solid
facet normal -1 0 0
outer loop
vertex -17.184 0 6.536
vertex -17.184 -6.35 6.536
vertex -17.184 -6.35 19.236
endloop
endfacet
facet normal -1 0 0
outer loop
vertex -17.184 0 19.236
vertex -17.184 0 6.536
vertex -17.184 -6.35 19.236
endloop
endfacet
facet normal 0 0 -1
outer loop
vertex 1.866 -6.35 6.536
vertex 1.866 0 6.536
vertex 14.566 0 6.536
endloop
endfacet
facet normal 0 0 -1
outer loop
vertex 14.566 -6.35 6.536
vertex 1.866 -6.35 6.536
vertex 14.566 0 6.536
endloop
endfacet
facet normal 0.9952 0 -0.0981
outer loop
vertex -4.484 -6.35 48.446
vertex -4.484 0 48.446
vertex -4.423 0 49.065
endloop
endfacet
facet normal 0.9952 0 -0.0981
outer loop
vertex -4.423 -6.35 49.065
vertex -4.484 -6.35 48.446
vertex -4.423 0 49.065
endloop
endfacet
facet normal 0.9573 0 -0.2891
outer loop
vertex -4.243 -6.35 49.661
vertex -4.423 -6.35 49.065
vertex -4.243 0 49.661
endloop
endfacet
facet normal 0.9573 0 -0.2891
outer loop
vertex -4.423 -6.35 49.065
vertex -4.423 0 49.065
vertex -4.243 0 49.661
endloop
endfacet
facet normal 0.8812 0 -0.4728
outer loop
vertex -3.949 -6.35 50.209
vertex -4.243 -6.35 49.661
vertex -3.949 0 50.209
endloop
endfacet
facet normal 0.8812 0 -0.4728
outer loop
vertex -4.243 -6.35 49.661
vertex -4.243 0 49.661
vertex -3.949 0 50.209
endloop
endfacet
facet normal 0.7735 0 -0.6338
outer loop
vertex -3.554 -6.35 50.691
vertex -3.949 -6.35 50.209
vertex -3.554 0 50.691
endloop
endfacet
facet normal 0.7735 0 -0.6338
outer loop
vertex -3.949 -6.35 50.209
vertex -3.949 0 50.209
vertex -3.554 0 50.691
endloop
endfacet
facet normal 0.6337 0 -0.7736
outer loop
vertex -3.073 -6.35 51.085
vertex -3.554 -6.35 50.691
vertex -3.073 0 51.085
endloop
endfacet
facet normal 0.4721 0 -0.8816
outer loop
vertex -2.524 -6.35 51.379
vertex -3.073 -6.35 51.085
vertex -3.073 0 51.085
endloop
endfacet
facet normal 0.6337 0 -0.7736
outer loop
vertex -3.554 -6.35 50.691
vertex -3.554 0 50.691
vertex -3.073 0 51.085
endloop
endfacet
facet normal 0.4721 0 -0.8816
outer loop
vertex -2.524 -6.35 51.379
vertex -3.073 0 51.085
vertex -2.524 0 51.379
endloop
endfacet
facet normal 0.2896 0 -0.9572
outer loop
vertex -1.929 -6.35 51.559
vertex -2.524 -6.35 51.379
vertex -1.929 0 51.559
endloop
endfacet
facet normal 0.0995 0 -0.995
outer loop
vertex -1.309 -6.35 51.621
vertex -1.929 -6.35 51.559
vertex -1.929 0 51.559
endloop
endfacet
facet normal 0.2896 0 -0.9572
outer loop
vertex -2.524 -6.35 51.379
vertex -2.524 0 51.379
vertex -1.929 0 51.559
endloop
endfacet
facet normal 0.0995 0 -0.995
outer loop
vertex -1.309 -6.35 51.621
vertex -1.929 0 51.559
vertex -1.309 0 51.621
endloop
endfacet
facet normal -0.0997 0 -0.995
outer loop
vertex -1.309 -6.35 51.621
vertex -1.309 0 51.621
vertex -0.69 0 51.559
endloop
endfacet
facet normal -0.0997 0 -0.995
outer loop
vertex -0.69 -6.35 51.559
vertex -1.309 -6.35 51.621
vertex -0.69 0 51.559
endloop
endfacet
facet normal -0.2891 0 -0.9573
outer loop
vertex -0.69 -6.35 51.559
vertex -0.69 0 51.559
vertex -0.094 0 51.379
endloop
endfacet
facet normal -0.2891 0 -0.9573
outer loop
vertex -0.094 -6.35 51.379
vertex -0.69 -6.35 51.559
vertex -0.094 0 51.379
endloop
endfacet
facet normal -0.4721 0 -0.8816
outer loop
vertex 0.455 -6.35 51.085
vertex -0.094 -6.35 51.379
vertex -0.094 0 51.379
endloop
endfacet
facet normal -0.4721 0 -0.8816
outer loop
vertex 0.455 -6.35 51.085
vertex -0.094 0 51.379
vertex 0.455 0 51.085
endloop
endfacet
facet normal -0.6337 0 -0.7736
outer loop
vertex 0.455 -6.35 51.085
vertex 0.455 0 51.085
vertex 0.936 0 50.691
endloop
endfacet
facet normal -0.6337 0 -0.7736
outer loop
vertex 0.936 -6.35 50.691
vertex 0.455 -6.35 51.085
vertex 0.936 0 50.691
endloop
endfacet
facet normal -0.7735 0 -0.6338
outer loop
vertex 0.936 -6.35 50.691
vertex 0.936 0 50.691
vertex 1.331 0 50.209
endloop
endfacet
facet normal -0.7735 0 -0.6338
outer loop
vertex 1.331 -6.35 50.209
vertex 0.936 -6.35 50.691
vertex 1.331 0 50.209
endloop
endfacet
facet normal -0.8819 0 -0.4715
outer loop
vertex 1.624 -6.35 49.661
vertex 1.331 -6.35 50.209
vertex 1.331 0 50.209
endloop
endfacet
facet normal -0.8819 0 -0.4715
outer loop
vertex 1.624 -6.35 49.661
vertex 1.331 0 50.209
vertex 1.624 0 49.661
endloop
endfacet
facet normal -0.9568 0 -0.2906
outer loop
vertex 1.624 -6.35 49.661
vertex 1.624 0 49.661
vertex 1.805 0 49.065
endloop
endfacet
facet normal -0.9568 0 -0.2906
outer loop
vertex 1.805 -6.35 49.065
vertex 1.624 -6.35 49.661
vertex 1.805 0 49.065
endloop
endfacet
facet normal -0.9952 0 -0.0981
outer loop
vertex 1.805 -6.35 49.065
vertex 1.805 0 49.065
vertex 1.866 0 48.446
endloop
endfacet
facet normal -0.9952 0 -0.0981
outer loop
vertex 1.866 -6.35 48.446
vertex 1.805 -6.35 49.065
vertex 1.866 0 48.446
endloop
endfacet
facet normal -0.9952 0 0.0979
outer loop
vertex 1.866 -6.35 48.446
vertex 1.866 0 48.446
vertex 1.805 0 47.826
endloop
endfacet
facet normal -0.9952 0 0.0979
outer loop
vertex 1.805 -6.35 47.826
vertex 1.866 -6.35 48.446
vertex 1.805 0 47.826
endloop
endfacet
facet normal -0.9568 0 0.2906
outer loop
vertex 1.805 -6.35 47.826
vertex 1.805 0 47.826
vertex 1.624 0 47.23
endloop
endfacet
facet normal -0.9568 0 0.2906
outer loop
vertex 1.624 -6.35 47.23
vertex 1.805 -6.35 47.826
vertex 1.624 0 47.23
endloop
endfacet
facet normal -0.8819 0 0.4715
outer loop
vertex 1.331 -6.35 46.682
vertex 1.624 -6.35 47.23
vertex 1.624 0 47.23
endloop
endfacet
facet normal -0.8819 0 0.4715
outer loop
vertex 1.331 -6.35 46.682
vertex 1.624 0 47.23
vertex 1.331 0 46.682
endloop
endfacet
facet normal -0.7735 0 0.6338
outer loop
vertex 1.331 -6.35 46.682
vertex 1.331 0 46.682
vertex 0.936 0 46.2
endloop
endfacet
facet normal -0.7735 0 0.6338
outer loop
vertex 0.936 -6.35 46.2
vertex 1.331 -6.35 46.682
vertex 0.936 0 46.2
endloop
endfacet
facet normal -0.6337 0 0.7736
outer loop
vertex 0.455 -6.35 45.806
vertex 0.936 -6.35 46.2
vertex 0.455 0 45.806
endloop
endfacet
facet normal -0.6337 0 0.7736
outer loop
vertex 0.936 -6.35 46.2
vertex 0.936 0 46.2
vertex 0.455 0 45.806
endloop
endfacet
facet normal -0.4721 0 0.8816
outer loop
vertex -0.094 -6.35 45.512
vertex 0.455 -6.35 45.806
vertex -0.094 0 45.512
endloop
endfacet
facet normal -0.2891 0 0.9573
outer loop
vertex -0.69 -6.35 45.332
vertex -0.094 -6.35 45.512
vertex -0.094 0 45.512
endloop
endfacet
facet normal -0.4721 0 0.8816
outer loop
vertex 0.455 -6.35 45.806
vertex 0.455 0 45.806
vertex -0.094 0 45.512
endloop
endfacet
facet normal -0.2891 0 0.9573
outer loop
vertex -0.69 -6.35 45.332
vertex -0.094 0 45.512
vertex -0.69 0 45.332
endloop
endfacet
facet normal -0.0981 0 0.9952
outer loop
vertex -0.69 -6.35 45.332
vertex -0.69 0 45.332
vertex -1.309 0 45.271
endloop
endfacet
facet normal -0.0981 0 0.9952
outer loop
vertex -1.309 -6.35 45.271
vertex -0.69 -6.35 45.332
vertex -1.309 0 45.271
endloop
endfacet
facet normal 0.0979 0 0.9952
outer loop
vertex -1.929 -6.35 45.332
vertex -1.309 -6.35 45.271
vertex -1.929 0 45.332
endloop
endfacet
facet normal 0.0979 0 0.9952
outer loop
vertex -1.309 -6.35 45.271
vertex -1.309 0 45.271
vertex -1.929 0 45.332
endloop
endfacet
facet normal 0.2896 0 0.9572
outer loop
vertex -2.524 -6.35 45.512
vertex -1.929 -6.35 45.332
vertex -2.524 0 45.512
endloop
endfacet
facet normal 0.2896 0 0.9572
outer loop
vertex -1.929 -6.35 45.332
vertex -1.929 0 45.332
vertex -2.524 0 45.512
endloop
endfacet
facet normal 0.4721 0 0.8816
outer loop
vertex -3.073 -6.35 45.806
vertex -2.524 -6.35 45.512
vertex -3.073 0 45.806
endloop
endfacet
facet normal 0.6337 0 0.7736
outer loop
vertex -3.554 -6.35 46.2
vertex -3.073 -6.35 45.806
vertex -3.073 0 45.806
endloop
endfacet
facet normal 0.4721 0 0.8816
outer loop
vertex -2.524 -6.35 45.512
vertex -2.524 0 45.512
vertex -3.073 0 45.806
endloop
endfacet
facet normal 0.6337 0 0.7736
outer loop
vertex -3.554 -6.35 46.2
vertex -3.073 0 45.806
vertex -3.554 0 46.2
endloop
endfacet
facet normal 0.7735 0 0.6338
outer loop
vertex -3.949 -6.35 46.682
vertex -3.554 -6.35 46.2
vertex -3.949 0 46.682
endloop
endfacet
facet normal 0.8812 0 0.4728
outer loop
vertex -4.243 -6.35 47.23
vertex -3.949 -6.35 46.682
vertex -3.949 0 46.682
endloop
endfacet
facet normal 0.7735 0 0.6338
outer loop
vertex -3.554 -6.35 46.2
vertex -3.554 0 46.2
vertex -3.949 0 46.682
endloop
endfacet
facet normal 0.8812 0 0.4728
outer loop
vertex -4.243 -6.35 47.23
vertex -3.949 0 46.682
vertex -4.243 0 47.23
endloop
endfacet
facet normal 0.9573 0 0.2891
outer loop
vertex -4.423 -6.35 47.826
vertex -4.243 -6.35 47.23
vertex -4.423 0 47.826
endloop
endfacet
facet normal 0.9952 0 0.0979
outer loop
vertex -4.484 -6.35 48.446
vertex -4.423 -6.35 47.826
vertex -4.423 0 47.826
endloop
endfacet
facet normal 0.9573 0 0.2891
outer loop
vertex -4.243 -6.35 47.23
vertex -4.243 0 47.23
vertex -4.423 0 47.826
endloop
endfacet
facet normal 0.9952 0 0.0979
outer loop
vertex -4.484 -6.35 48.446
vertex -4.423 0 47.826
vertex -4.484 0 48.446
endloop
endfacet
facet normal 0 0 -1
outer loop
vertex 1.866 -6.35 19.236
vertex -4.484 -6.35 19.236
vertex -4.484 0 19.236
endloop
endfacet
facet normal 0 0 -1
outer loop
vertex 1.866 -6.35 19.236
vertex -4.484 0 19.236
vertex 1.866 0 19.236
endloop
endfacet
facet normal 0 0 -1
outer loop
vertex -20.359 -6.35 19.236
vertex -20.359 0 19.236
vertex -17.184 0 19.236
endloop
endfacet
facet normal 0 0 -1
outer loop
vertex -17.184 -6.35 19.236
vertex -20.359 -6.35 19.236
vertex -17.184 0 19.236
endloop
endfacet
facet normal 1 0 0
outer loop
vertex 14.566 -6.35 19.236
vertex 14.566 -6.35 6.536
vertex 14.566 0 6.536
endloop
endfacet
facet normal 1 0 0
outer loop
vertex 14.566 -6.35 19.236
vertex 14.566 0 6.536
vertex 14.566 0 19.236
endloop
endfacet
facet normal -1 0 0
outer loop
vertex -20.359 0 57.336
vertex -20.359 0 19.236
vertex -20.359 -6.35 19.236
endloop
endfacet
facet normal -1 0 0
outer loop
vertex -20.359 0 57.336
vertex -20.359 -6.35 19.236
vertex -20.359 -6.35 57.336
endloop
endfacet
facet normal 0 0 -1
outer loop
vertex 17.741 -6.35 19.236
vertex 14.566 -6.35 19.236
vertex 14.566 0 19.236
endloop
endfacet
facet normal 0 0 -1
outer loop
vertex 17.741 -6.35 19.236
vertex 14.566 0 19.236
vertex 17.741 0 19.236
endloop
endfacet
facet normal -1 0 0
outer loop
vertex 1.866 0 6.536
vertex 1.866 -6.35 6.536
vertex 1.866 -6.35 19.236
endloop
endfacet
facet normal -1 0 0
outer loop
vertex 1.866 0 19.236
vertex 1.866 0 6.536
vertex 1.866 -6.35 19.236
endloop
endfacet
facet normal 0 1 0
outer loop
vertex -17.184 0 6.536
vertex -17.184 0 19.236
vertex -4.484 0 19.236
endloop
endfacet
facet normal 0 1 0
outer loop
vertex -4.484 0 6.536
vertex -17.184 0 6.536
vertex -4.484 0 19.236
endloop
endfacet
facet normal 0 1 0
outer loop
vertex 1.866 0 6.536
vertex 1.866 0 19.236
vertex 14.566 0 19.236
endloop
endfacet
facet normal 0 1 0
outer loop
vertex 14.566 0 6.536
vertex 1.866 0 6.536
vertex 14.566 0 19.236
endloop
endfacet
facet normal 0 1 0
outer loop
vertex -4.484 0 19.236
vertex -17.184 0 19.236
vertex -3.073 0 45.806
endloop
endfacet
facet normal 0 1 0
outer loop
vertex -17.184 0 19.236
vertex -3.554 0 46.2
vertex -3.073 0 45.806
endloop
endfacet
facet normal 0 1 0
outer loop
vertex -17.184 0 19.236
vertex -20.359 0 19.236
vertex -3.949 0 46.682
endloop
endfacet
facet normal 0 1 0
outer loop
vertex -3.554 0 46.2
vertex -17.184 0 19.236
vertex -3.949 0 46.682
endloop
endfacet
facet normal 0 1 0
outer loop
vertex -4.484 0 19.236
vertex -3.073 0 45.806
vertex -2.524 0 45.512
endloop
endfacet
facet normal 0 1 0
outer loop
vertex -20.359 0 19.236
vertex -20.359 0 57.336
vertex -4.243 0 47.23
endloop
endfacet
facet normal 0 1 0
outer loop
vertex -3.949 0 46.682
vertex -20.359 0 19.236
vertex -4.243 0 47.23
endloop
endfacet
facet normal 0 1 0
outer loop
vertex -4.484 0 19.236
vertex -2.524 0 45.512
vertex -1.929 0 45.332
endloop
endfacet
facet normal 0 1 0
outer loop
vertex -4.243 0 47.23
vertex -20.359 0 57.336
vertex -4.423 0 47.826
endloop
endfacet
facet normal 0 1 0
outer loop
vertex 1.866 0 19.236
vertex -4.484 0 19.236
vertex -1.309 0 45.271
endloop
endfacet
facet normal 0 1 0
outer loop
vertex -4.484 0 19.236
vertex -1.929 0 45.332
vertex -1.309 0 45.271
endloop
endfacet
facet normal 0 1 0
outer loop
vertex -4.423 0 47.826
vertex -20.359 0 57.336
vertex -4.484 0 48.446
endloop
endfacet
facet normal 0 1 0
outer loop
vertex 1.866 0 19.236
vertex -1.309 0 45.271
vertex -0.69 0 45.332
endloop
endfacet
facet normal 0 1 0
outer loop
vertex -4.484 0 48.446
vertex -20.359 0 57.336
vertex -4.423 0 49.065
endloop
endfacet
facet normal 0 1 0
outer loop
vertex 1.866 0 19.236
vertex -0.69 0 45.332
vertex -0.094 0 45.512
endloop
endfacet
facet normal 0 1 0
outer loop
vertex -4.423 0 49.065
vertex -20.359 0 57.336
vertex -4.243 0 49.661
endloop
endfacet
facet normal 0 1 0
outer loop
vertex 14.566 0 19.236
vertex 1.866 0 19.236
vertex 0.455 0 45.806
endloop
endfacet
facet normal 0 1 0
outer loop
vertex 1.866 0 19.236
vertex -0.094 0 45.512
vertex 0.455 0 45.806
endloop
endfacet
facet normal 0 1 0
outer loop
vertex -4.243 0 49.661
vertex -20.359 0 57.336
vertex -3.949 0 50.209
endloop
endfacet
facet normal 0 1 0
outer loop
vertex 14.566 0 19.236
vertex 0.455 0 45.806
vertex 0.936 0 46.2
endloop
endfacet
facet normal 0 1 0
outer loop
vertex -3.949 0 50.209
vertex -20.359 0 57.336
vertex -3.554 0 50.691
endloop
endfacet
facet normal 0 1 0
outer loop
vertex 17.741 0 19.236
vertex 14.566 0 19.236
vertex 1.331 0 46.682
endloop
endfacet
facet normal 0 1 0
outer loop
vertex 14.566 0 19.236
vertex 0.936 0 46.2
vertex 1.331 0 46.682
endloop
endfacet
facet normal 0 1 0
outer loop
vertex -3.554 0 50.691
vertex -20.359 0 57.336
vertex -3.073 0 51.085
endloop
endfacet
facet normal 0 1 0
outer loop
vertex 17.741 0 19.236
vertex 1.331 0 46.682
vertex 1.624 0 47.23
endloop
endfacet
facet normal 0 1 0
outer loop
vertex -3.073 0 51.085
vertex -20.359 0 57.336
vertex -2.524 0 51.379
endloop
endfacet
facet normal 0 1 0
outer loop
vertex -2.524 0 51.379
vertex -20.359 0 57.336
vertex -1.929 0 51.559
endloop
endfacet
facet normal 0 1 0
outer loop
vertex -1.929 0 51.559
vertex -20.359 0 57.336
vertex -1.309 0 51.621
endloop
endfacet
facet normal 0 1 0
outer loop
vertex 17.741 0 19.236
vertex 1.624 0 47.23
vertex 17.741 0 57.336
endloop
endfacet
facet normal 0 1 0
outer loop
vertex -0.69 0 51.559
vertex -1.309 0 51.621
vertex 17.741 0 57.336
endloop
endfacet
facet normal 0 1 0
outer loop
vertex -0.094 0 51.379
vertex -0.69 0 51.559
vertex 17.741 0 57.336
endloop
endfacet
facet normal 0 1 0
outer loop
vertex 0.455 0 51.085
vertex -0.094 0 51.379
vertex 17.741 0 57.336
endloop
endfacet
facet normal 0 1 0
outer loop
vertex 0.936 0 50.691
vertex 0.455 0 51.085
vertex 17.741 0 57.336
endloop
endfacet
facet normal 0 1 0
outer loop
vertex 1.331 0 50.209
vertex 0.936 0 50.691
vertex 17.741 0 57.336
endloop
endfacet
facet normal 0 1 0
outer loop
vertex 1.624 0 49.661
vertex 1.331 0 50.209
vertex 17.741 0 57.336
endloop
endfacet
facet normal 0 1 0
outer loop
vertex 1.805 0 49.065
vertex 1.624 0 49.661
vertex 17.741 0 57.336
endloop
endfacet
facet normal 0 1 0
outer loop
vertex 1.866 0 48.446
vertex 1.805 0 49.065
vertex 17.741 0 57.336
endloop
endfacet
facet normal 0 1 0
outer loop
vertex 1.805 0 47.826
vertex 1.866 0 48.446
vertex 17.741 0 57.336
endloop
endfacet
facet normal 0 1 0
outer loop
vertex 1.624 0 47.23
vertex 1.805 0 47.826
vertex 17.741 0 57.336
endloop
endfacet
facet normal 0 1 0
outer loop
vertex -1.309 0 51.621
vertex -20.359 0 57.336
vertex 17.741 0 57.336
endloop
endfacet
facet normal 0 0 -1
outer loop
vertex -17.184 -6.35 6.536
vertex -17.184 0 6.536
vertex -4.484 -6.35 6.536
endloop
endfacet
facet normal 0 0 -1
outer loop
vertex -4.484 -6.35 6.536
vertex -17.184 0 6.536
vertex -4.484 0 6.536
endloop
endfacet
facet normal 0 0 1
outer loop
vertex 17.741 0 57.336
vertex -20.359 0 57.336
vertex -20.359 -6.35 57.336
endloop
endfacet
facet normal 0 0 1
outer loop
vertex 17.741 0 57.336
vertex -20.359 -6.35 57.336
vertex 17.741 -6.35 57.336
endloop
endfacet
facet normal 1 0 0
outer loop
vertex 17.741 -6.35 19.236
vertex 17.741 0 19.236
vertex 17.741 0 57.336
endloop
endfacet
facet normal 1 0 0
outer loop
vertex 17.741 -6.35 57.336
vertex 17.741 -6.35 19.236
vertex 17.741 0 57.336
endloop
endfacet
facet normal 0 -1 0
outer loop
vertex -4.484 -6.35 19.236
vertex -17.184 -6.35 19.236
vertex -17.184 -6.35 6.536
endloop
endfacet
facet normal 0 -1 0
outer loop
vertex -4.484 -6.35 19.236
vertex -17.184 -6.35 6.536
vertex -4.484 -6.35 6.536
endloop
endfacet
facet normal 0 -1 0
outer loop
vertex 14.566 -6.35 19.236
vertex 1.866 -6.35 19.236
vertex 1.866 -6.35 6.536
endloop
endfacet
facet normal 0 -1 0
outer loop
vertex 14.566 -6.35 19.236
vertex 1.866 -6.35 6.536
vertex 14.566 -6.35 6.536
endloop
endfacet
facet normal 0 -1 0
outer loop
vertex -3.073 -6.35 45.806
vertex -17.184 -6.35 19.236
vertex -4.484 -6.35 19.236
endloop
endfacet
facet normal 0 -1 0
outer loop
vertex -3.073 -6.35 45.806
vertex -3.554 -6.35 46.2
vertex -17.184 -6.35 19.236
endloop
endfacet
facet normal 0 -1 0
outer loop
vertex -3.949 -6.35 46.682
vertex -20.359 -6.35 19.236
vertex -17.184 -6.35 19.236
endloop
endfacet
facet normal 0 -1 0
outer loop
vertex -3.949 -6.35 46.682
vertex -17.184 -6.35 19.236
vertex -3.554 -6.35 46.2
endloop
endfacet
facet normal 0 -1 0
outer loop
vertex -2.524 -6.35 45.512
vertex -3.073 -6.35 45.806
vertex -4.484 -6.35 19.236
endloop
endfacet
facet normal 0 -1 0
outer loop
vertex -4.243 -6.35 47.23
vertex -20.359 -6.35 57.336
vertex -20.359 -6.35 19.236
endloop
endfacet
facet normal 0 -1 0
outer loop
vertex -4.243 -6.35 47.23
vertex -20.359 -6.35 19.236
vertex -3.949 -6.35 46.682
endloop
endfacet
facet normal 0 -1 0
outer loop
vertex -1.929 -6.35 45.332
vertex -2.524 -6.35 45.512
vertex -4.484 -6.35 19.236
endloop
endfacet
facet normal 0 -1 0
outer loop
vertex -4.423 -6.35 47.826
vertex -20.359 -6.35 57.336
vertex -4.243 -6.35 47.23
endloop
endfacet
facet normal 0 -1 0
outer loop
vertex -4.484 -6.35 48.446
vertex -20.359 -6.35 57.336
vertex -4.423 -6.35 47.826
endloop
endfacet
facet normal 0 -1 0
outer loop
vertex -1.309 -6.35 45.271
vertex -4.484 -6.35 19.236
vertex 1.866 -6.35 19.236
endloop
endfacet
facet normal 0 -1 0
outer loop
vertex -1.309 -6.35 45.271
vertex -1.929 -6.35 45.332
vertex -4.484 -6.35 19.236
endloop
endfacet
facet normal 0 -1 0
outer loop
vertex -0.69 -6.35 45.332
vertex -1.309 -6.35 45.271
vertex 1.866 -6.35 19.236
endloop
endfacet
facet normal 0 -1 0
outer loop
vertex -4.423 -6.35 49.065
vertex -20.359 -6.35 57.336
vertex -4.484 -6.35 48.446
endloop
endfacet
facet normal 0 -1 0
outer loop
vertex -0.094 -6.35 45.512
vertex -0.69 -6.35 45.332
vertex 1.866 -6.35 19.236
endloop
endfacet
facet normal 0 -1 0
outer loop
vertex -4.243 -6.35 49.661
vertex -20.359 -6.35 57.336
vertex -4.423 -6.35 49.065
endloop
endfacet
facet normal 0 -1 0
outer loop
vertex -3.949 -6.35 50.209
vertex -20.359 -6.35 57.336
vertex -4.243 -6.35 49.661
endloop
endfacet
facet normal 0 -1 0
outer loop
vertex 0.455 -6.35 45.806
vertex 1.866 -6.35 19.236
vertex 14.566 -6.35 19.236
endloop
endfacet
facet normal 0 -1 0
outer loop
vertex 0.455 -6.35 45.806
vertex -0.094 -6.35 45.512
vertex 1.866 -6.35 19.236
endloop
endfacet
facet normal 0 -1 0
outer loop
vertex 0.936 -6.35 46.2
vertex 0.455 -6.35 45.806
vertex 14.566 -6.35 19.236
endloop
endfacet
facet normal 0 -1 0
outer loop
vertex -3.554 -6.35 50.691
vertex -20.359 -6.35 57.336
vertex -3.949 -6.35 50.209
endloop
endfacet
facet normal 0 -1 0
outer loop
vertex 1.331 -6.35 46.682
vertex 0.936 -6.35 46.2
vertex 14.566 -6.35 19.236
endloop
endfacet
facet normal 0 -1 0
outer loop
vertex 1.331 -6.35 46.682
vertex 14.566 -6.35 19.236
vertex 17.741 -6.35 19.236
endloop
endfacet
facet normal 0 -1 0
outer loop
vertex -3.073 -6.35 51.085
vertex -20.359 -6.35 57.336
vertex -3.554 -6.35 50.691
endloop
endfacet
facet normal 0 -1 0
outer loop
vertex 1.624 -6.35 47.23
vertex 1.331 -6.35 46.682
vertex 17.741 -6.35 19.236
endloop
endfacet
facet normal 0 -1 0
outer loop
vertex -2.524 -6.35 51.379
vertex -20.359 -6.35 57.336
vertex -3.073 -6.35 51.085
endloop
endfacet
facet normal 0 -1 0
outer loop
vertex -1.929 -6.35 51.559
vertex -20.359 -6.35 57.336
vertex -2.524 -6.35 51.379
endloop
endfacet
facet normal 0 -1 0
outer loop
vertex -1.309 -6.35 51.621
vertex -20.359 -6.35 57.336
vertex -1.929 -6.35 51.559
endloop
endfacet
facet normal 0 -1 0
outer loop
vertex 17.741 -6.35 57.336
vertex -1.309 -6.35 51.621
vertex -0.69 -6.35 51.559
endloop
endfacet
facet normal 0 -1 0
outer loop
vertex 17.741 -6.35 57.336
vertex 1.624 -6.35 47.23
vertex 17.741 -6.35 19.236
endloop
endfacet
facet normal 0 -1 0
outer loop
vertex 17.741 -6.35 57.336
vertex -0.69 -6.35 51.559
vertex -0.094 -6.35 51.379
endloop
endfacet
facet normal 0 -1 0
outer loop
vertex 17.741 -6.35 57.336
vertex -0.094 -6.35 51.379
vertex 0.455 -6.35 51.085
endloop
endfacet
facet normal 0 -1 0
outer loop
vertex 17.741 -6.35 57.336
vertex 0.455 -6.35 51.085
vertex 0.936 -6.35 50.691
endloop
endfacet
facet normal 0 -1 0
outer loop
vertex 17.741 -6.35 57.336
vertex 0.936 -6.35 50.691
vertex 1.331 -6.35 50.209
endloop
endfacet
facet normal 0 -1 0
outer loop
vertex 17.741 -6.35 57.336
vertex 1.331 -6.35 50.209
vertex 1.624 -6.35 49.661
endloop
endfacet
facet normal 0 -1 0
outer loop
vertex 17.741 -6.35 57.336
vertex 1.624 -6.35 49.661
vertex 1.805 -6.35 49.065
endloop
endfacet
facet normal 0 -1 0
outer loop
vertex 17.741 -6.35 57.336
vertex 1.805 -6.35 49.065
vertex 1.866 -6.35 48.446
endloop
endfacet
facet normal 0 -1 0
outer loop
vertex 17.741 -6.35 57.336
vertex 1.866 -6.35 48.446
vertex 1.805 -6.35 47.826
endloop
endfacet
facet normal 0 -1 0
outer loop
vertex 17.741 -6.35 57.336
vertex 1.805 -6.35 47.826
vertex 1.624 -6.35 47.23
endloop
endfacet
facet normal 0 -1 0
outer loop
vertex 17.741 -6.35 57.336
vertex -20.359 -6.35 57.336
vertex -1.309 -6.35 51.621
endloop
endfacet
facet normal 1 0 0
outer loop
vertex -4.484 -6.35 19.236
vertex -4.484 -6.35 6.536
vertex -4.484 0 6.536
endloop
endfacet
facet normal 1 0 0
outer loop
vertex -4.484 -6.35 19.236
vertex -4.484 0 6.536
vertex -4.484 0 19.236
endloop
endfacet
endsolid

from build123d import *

# Parameters (mm, degrees)
F0_W     = 38.1
F0_H     = 50.8
F1_DEPTH = 6.35
F2_R     = 3.175
F3_DEPTH = 6.351
F4_W     = 3.175
F4_H     = 12.7
F5_DEPTH = 6.351
F6_W     = 6.35
F6_H     = 12.7
F7_DEPTH = 6.351


with BuildPart() as f1:
    # F0 (on Front) → F1 (new body)
    with BuildSketch(Plane.XZ):
        with Locations((-1.309197, 31.935506)):
            Rectangle(F0_W, F0_H)
    extrude(amount=F1_DEPTH)

    # F2 (on face) → F3 (cut, through all)
    with BuildSketch(Plane(origin=(0, 0, 0), x_dir=(-1, 0, 0), z_dir=(0, 1, 0))):
        with Locations((1.309197, 48.445506)):
            Circle(F2_R)
    extrude(amount=-F3_DEPTH, mode=Mode.SUBTRACT)

    # F4 (on face) → F5 (cut, through all)
    with BuildSketch(Plane.XZ.offset(6.35)):
        with Locations((-18.771697, 12.885506)):
            Rectangle(F4_W, F4_H)
        with Locations((16.153303, 12.885506)):
            Rectangle(F4_W, F4_H)
    extrude(amount=-F5_DEPTH, mode=Mode.SUBTRACT)

    # F6 (on face) → F7 (cut, through all)
    with BuildSketch(Plane.XZ.offset(6.35)):
        with Locations((-1.309197, 12.885506)):
            Rectangle(F6_W, F6_H)
    extrude(amount=-F7_DEPTH, mode=Mode.SUBTRACT)


solid = f1.part
